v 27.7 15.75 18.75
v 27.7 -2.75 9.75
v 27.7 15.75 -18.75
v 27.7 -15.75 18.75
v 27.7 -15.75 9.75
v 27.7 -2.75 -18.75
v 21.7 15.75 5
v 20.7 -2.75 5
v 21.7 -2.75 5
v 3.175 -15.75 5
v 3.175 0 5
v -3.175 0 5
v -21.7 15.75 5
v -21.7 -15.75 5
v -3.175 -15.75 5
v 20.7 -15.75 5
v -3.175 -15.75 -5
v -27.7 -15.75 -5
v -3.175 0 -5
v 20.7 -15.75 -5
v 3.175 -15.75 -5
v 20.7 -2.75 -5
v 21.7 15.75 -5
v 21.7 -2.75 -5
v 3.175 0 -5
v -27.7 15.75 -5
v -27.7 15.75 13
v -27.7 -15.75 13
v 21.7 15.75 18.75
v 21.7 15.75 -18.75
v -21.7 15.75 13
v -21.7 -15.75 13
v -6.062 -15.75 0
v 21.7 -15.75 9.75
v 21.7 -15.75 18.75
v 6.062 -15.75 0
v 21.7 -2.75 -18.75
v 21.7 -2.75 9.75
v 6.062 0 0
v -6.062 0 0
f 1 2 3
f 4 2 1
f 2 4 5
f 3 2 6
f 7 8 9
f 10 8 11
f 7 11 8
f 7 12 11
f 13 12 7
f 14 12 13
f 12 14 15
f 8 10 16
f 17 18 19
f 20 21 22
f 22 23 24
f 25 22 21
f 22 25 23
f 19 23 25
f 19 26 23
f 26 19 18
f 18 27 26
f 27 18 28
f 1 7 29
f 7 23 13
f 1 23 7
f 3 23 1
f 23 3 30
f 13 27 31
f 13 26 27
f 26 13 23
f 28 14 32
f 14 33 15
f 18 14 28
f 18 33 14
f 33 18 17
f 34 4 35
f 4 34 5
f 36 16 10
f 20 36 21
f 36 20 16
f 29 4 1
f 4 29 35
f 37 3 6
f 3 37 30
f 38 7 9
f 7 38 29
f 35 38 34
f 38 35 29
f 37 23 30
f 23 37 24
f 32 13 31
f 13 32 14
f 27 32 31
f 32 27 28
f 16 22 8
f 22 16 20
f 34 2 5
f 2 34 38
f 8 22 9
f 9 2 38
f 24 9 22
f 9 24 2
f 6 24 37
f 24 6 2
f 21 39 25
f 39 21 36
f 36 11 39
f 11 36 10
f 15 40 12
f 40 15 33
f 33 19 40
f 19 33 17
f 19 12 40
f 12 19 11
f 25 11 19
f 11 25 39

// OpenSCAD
$fn=64;

L = 55.4;
W = 31.5;
H = 37.5;

beam_h = 10;
beam_w = W;
beam_l = L;

plate_t = 6;
plate_h = H;
plate_w = W;

leg_t = 6;
leg_h = 18;
leg_w = W;

hex_flat = 10.5;
hex_r = hex_flat / sqrt(3);
hex_h = beam_w + 2;

chamfer_drop = 10;
chamfer_run = 14;

module hex_prism(h, r){
    cylinder(h=h, r=r, $fn=6);
}

module beam(){
    translate([-beam_l/2, -beam_w/2, -beam_h/2])
        cube([beam_l, beam_w, beam_h], center=false);
}

module end_plate(){
    translate([beam_l/2 - plate_t, -plate_w/2, -plate_h/2])
        cube([plate_t, plate_w, plate_h], center=false);
}

module leg(){
    translate([-beam_l/2, -leg_w/2, -beam_h/2])
        cube([leg_t, leg_w, leg_h], center=false);
}

module chamfer_cut(){
    translate([beam_l/2 - plate_t - 1, -plate_w/2 - 1, plate_h/2 - chamfer_drop])
        rotate([0,90,0])
            linear_extrude(height=plate_t + 2)
                polygon(points=[
                    [-1, -1],
                    [plate_w + 2, -1],
                    [plate_w + 2, chamfer_run],
                    [-1, chamfer_run]
                ]);
}

module bracket_solid(){
    union(){
        beam();
        end_plate();
        leg();
    }
}

module bracket(){
    difference(){
        difference(){
            bracket_solid();
            chamfer_cut();
        }
        translate([0, 0, 0])
            rotate([90,0,0])
                hex_prism(h=hex_h, r=hex_r);
    }
}

bracket();
